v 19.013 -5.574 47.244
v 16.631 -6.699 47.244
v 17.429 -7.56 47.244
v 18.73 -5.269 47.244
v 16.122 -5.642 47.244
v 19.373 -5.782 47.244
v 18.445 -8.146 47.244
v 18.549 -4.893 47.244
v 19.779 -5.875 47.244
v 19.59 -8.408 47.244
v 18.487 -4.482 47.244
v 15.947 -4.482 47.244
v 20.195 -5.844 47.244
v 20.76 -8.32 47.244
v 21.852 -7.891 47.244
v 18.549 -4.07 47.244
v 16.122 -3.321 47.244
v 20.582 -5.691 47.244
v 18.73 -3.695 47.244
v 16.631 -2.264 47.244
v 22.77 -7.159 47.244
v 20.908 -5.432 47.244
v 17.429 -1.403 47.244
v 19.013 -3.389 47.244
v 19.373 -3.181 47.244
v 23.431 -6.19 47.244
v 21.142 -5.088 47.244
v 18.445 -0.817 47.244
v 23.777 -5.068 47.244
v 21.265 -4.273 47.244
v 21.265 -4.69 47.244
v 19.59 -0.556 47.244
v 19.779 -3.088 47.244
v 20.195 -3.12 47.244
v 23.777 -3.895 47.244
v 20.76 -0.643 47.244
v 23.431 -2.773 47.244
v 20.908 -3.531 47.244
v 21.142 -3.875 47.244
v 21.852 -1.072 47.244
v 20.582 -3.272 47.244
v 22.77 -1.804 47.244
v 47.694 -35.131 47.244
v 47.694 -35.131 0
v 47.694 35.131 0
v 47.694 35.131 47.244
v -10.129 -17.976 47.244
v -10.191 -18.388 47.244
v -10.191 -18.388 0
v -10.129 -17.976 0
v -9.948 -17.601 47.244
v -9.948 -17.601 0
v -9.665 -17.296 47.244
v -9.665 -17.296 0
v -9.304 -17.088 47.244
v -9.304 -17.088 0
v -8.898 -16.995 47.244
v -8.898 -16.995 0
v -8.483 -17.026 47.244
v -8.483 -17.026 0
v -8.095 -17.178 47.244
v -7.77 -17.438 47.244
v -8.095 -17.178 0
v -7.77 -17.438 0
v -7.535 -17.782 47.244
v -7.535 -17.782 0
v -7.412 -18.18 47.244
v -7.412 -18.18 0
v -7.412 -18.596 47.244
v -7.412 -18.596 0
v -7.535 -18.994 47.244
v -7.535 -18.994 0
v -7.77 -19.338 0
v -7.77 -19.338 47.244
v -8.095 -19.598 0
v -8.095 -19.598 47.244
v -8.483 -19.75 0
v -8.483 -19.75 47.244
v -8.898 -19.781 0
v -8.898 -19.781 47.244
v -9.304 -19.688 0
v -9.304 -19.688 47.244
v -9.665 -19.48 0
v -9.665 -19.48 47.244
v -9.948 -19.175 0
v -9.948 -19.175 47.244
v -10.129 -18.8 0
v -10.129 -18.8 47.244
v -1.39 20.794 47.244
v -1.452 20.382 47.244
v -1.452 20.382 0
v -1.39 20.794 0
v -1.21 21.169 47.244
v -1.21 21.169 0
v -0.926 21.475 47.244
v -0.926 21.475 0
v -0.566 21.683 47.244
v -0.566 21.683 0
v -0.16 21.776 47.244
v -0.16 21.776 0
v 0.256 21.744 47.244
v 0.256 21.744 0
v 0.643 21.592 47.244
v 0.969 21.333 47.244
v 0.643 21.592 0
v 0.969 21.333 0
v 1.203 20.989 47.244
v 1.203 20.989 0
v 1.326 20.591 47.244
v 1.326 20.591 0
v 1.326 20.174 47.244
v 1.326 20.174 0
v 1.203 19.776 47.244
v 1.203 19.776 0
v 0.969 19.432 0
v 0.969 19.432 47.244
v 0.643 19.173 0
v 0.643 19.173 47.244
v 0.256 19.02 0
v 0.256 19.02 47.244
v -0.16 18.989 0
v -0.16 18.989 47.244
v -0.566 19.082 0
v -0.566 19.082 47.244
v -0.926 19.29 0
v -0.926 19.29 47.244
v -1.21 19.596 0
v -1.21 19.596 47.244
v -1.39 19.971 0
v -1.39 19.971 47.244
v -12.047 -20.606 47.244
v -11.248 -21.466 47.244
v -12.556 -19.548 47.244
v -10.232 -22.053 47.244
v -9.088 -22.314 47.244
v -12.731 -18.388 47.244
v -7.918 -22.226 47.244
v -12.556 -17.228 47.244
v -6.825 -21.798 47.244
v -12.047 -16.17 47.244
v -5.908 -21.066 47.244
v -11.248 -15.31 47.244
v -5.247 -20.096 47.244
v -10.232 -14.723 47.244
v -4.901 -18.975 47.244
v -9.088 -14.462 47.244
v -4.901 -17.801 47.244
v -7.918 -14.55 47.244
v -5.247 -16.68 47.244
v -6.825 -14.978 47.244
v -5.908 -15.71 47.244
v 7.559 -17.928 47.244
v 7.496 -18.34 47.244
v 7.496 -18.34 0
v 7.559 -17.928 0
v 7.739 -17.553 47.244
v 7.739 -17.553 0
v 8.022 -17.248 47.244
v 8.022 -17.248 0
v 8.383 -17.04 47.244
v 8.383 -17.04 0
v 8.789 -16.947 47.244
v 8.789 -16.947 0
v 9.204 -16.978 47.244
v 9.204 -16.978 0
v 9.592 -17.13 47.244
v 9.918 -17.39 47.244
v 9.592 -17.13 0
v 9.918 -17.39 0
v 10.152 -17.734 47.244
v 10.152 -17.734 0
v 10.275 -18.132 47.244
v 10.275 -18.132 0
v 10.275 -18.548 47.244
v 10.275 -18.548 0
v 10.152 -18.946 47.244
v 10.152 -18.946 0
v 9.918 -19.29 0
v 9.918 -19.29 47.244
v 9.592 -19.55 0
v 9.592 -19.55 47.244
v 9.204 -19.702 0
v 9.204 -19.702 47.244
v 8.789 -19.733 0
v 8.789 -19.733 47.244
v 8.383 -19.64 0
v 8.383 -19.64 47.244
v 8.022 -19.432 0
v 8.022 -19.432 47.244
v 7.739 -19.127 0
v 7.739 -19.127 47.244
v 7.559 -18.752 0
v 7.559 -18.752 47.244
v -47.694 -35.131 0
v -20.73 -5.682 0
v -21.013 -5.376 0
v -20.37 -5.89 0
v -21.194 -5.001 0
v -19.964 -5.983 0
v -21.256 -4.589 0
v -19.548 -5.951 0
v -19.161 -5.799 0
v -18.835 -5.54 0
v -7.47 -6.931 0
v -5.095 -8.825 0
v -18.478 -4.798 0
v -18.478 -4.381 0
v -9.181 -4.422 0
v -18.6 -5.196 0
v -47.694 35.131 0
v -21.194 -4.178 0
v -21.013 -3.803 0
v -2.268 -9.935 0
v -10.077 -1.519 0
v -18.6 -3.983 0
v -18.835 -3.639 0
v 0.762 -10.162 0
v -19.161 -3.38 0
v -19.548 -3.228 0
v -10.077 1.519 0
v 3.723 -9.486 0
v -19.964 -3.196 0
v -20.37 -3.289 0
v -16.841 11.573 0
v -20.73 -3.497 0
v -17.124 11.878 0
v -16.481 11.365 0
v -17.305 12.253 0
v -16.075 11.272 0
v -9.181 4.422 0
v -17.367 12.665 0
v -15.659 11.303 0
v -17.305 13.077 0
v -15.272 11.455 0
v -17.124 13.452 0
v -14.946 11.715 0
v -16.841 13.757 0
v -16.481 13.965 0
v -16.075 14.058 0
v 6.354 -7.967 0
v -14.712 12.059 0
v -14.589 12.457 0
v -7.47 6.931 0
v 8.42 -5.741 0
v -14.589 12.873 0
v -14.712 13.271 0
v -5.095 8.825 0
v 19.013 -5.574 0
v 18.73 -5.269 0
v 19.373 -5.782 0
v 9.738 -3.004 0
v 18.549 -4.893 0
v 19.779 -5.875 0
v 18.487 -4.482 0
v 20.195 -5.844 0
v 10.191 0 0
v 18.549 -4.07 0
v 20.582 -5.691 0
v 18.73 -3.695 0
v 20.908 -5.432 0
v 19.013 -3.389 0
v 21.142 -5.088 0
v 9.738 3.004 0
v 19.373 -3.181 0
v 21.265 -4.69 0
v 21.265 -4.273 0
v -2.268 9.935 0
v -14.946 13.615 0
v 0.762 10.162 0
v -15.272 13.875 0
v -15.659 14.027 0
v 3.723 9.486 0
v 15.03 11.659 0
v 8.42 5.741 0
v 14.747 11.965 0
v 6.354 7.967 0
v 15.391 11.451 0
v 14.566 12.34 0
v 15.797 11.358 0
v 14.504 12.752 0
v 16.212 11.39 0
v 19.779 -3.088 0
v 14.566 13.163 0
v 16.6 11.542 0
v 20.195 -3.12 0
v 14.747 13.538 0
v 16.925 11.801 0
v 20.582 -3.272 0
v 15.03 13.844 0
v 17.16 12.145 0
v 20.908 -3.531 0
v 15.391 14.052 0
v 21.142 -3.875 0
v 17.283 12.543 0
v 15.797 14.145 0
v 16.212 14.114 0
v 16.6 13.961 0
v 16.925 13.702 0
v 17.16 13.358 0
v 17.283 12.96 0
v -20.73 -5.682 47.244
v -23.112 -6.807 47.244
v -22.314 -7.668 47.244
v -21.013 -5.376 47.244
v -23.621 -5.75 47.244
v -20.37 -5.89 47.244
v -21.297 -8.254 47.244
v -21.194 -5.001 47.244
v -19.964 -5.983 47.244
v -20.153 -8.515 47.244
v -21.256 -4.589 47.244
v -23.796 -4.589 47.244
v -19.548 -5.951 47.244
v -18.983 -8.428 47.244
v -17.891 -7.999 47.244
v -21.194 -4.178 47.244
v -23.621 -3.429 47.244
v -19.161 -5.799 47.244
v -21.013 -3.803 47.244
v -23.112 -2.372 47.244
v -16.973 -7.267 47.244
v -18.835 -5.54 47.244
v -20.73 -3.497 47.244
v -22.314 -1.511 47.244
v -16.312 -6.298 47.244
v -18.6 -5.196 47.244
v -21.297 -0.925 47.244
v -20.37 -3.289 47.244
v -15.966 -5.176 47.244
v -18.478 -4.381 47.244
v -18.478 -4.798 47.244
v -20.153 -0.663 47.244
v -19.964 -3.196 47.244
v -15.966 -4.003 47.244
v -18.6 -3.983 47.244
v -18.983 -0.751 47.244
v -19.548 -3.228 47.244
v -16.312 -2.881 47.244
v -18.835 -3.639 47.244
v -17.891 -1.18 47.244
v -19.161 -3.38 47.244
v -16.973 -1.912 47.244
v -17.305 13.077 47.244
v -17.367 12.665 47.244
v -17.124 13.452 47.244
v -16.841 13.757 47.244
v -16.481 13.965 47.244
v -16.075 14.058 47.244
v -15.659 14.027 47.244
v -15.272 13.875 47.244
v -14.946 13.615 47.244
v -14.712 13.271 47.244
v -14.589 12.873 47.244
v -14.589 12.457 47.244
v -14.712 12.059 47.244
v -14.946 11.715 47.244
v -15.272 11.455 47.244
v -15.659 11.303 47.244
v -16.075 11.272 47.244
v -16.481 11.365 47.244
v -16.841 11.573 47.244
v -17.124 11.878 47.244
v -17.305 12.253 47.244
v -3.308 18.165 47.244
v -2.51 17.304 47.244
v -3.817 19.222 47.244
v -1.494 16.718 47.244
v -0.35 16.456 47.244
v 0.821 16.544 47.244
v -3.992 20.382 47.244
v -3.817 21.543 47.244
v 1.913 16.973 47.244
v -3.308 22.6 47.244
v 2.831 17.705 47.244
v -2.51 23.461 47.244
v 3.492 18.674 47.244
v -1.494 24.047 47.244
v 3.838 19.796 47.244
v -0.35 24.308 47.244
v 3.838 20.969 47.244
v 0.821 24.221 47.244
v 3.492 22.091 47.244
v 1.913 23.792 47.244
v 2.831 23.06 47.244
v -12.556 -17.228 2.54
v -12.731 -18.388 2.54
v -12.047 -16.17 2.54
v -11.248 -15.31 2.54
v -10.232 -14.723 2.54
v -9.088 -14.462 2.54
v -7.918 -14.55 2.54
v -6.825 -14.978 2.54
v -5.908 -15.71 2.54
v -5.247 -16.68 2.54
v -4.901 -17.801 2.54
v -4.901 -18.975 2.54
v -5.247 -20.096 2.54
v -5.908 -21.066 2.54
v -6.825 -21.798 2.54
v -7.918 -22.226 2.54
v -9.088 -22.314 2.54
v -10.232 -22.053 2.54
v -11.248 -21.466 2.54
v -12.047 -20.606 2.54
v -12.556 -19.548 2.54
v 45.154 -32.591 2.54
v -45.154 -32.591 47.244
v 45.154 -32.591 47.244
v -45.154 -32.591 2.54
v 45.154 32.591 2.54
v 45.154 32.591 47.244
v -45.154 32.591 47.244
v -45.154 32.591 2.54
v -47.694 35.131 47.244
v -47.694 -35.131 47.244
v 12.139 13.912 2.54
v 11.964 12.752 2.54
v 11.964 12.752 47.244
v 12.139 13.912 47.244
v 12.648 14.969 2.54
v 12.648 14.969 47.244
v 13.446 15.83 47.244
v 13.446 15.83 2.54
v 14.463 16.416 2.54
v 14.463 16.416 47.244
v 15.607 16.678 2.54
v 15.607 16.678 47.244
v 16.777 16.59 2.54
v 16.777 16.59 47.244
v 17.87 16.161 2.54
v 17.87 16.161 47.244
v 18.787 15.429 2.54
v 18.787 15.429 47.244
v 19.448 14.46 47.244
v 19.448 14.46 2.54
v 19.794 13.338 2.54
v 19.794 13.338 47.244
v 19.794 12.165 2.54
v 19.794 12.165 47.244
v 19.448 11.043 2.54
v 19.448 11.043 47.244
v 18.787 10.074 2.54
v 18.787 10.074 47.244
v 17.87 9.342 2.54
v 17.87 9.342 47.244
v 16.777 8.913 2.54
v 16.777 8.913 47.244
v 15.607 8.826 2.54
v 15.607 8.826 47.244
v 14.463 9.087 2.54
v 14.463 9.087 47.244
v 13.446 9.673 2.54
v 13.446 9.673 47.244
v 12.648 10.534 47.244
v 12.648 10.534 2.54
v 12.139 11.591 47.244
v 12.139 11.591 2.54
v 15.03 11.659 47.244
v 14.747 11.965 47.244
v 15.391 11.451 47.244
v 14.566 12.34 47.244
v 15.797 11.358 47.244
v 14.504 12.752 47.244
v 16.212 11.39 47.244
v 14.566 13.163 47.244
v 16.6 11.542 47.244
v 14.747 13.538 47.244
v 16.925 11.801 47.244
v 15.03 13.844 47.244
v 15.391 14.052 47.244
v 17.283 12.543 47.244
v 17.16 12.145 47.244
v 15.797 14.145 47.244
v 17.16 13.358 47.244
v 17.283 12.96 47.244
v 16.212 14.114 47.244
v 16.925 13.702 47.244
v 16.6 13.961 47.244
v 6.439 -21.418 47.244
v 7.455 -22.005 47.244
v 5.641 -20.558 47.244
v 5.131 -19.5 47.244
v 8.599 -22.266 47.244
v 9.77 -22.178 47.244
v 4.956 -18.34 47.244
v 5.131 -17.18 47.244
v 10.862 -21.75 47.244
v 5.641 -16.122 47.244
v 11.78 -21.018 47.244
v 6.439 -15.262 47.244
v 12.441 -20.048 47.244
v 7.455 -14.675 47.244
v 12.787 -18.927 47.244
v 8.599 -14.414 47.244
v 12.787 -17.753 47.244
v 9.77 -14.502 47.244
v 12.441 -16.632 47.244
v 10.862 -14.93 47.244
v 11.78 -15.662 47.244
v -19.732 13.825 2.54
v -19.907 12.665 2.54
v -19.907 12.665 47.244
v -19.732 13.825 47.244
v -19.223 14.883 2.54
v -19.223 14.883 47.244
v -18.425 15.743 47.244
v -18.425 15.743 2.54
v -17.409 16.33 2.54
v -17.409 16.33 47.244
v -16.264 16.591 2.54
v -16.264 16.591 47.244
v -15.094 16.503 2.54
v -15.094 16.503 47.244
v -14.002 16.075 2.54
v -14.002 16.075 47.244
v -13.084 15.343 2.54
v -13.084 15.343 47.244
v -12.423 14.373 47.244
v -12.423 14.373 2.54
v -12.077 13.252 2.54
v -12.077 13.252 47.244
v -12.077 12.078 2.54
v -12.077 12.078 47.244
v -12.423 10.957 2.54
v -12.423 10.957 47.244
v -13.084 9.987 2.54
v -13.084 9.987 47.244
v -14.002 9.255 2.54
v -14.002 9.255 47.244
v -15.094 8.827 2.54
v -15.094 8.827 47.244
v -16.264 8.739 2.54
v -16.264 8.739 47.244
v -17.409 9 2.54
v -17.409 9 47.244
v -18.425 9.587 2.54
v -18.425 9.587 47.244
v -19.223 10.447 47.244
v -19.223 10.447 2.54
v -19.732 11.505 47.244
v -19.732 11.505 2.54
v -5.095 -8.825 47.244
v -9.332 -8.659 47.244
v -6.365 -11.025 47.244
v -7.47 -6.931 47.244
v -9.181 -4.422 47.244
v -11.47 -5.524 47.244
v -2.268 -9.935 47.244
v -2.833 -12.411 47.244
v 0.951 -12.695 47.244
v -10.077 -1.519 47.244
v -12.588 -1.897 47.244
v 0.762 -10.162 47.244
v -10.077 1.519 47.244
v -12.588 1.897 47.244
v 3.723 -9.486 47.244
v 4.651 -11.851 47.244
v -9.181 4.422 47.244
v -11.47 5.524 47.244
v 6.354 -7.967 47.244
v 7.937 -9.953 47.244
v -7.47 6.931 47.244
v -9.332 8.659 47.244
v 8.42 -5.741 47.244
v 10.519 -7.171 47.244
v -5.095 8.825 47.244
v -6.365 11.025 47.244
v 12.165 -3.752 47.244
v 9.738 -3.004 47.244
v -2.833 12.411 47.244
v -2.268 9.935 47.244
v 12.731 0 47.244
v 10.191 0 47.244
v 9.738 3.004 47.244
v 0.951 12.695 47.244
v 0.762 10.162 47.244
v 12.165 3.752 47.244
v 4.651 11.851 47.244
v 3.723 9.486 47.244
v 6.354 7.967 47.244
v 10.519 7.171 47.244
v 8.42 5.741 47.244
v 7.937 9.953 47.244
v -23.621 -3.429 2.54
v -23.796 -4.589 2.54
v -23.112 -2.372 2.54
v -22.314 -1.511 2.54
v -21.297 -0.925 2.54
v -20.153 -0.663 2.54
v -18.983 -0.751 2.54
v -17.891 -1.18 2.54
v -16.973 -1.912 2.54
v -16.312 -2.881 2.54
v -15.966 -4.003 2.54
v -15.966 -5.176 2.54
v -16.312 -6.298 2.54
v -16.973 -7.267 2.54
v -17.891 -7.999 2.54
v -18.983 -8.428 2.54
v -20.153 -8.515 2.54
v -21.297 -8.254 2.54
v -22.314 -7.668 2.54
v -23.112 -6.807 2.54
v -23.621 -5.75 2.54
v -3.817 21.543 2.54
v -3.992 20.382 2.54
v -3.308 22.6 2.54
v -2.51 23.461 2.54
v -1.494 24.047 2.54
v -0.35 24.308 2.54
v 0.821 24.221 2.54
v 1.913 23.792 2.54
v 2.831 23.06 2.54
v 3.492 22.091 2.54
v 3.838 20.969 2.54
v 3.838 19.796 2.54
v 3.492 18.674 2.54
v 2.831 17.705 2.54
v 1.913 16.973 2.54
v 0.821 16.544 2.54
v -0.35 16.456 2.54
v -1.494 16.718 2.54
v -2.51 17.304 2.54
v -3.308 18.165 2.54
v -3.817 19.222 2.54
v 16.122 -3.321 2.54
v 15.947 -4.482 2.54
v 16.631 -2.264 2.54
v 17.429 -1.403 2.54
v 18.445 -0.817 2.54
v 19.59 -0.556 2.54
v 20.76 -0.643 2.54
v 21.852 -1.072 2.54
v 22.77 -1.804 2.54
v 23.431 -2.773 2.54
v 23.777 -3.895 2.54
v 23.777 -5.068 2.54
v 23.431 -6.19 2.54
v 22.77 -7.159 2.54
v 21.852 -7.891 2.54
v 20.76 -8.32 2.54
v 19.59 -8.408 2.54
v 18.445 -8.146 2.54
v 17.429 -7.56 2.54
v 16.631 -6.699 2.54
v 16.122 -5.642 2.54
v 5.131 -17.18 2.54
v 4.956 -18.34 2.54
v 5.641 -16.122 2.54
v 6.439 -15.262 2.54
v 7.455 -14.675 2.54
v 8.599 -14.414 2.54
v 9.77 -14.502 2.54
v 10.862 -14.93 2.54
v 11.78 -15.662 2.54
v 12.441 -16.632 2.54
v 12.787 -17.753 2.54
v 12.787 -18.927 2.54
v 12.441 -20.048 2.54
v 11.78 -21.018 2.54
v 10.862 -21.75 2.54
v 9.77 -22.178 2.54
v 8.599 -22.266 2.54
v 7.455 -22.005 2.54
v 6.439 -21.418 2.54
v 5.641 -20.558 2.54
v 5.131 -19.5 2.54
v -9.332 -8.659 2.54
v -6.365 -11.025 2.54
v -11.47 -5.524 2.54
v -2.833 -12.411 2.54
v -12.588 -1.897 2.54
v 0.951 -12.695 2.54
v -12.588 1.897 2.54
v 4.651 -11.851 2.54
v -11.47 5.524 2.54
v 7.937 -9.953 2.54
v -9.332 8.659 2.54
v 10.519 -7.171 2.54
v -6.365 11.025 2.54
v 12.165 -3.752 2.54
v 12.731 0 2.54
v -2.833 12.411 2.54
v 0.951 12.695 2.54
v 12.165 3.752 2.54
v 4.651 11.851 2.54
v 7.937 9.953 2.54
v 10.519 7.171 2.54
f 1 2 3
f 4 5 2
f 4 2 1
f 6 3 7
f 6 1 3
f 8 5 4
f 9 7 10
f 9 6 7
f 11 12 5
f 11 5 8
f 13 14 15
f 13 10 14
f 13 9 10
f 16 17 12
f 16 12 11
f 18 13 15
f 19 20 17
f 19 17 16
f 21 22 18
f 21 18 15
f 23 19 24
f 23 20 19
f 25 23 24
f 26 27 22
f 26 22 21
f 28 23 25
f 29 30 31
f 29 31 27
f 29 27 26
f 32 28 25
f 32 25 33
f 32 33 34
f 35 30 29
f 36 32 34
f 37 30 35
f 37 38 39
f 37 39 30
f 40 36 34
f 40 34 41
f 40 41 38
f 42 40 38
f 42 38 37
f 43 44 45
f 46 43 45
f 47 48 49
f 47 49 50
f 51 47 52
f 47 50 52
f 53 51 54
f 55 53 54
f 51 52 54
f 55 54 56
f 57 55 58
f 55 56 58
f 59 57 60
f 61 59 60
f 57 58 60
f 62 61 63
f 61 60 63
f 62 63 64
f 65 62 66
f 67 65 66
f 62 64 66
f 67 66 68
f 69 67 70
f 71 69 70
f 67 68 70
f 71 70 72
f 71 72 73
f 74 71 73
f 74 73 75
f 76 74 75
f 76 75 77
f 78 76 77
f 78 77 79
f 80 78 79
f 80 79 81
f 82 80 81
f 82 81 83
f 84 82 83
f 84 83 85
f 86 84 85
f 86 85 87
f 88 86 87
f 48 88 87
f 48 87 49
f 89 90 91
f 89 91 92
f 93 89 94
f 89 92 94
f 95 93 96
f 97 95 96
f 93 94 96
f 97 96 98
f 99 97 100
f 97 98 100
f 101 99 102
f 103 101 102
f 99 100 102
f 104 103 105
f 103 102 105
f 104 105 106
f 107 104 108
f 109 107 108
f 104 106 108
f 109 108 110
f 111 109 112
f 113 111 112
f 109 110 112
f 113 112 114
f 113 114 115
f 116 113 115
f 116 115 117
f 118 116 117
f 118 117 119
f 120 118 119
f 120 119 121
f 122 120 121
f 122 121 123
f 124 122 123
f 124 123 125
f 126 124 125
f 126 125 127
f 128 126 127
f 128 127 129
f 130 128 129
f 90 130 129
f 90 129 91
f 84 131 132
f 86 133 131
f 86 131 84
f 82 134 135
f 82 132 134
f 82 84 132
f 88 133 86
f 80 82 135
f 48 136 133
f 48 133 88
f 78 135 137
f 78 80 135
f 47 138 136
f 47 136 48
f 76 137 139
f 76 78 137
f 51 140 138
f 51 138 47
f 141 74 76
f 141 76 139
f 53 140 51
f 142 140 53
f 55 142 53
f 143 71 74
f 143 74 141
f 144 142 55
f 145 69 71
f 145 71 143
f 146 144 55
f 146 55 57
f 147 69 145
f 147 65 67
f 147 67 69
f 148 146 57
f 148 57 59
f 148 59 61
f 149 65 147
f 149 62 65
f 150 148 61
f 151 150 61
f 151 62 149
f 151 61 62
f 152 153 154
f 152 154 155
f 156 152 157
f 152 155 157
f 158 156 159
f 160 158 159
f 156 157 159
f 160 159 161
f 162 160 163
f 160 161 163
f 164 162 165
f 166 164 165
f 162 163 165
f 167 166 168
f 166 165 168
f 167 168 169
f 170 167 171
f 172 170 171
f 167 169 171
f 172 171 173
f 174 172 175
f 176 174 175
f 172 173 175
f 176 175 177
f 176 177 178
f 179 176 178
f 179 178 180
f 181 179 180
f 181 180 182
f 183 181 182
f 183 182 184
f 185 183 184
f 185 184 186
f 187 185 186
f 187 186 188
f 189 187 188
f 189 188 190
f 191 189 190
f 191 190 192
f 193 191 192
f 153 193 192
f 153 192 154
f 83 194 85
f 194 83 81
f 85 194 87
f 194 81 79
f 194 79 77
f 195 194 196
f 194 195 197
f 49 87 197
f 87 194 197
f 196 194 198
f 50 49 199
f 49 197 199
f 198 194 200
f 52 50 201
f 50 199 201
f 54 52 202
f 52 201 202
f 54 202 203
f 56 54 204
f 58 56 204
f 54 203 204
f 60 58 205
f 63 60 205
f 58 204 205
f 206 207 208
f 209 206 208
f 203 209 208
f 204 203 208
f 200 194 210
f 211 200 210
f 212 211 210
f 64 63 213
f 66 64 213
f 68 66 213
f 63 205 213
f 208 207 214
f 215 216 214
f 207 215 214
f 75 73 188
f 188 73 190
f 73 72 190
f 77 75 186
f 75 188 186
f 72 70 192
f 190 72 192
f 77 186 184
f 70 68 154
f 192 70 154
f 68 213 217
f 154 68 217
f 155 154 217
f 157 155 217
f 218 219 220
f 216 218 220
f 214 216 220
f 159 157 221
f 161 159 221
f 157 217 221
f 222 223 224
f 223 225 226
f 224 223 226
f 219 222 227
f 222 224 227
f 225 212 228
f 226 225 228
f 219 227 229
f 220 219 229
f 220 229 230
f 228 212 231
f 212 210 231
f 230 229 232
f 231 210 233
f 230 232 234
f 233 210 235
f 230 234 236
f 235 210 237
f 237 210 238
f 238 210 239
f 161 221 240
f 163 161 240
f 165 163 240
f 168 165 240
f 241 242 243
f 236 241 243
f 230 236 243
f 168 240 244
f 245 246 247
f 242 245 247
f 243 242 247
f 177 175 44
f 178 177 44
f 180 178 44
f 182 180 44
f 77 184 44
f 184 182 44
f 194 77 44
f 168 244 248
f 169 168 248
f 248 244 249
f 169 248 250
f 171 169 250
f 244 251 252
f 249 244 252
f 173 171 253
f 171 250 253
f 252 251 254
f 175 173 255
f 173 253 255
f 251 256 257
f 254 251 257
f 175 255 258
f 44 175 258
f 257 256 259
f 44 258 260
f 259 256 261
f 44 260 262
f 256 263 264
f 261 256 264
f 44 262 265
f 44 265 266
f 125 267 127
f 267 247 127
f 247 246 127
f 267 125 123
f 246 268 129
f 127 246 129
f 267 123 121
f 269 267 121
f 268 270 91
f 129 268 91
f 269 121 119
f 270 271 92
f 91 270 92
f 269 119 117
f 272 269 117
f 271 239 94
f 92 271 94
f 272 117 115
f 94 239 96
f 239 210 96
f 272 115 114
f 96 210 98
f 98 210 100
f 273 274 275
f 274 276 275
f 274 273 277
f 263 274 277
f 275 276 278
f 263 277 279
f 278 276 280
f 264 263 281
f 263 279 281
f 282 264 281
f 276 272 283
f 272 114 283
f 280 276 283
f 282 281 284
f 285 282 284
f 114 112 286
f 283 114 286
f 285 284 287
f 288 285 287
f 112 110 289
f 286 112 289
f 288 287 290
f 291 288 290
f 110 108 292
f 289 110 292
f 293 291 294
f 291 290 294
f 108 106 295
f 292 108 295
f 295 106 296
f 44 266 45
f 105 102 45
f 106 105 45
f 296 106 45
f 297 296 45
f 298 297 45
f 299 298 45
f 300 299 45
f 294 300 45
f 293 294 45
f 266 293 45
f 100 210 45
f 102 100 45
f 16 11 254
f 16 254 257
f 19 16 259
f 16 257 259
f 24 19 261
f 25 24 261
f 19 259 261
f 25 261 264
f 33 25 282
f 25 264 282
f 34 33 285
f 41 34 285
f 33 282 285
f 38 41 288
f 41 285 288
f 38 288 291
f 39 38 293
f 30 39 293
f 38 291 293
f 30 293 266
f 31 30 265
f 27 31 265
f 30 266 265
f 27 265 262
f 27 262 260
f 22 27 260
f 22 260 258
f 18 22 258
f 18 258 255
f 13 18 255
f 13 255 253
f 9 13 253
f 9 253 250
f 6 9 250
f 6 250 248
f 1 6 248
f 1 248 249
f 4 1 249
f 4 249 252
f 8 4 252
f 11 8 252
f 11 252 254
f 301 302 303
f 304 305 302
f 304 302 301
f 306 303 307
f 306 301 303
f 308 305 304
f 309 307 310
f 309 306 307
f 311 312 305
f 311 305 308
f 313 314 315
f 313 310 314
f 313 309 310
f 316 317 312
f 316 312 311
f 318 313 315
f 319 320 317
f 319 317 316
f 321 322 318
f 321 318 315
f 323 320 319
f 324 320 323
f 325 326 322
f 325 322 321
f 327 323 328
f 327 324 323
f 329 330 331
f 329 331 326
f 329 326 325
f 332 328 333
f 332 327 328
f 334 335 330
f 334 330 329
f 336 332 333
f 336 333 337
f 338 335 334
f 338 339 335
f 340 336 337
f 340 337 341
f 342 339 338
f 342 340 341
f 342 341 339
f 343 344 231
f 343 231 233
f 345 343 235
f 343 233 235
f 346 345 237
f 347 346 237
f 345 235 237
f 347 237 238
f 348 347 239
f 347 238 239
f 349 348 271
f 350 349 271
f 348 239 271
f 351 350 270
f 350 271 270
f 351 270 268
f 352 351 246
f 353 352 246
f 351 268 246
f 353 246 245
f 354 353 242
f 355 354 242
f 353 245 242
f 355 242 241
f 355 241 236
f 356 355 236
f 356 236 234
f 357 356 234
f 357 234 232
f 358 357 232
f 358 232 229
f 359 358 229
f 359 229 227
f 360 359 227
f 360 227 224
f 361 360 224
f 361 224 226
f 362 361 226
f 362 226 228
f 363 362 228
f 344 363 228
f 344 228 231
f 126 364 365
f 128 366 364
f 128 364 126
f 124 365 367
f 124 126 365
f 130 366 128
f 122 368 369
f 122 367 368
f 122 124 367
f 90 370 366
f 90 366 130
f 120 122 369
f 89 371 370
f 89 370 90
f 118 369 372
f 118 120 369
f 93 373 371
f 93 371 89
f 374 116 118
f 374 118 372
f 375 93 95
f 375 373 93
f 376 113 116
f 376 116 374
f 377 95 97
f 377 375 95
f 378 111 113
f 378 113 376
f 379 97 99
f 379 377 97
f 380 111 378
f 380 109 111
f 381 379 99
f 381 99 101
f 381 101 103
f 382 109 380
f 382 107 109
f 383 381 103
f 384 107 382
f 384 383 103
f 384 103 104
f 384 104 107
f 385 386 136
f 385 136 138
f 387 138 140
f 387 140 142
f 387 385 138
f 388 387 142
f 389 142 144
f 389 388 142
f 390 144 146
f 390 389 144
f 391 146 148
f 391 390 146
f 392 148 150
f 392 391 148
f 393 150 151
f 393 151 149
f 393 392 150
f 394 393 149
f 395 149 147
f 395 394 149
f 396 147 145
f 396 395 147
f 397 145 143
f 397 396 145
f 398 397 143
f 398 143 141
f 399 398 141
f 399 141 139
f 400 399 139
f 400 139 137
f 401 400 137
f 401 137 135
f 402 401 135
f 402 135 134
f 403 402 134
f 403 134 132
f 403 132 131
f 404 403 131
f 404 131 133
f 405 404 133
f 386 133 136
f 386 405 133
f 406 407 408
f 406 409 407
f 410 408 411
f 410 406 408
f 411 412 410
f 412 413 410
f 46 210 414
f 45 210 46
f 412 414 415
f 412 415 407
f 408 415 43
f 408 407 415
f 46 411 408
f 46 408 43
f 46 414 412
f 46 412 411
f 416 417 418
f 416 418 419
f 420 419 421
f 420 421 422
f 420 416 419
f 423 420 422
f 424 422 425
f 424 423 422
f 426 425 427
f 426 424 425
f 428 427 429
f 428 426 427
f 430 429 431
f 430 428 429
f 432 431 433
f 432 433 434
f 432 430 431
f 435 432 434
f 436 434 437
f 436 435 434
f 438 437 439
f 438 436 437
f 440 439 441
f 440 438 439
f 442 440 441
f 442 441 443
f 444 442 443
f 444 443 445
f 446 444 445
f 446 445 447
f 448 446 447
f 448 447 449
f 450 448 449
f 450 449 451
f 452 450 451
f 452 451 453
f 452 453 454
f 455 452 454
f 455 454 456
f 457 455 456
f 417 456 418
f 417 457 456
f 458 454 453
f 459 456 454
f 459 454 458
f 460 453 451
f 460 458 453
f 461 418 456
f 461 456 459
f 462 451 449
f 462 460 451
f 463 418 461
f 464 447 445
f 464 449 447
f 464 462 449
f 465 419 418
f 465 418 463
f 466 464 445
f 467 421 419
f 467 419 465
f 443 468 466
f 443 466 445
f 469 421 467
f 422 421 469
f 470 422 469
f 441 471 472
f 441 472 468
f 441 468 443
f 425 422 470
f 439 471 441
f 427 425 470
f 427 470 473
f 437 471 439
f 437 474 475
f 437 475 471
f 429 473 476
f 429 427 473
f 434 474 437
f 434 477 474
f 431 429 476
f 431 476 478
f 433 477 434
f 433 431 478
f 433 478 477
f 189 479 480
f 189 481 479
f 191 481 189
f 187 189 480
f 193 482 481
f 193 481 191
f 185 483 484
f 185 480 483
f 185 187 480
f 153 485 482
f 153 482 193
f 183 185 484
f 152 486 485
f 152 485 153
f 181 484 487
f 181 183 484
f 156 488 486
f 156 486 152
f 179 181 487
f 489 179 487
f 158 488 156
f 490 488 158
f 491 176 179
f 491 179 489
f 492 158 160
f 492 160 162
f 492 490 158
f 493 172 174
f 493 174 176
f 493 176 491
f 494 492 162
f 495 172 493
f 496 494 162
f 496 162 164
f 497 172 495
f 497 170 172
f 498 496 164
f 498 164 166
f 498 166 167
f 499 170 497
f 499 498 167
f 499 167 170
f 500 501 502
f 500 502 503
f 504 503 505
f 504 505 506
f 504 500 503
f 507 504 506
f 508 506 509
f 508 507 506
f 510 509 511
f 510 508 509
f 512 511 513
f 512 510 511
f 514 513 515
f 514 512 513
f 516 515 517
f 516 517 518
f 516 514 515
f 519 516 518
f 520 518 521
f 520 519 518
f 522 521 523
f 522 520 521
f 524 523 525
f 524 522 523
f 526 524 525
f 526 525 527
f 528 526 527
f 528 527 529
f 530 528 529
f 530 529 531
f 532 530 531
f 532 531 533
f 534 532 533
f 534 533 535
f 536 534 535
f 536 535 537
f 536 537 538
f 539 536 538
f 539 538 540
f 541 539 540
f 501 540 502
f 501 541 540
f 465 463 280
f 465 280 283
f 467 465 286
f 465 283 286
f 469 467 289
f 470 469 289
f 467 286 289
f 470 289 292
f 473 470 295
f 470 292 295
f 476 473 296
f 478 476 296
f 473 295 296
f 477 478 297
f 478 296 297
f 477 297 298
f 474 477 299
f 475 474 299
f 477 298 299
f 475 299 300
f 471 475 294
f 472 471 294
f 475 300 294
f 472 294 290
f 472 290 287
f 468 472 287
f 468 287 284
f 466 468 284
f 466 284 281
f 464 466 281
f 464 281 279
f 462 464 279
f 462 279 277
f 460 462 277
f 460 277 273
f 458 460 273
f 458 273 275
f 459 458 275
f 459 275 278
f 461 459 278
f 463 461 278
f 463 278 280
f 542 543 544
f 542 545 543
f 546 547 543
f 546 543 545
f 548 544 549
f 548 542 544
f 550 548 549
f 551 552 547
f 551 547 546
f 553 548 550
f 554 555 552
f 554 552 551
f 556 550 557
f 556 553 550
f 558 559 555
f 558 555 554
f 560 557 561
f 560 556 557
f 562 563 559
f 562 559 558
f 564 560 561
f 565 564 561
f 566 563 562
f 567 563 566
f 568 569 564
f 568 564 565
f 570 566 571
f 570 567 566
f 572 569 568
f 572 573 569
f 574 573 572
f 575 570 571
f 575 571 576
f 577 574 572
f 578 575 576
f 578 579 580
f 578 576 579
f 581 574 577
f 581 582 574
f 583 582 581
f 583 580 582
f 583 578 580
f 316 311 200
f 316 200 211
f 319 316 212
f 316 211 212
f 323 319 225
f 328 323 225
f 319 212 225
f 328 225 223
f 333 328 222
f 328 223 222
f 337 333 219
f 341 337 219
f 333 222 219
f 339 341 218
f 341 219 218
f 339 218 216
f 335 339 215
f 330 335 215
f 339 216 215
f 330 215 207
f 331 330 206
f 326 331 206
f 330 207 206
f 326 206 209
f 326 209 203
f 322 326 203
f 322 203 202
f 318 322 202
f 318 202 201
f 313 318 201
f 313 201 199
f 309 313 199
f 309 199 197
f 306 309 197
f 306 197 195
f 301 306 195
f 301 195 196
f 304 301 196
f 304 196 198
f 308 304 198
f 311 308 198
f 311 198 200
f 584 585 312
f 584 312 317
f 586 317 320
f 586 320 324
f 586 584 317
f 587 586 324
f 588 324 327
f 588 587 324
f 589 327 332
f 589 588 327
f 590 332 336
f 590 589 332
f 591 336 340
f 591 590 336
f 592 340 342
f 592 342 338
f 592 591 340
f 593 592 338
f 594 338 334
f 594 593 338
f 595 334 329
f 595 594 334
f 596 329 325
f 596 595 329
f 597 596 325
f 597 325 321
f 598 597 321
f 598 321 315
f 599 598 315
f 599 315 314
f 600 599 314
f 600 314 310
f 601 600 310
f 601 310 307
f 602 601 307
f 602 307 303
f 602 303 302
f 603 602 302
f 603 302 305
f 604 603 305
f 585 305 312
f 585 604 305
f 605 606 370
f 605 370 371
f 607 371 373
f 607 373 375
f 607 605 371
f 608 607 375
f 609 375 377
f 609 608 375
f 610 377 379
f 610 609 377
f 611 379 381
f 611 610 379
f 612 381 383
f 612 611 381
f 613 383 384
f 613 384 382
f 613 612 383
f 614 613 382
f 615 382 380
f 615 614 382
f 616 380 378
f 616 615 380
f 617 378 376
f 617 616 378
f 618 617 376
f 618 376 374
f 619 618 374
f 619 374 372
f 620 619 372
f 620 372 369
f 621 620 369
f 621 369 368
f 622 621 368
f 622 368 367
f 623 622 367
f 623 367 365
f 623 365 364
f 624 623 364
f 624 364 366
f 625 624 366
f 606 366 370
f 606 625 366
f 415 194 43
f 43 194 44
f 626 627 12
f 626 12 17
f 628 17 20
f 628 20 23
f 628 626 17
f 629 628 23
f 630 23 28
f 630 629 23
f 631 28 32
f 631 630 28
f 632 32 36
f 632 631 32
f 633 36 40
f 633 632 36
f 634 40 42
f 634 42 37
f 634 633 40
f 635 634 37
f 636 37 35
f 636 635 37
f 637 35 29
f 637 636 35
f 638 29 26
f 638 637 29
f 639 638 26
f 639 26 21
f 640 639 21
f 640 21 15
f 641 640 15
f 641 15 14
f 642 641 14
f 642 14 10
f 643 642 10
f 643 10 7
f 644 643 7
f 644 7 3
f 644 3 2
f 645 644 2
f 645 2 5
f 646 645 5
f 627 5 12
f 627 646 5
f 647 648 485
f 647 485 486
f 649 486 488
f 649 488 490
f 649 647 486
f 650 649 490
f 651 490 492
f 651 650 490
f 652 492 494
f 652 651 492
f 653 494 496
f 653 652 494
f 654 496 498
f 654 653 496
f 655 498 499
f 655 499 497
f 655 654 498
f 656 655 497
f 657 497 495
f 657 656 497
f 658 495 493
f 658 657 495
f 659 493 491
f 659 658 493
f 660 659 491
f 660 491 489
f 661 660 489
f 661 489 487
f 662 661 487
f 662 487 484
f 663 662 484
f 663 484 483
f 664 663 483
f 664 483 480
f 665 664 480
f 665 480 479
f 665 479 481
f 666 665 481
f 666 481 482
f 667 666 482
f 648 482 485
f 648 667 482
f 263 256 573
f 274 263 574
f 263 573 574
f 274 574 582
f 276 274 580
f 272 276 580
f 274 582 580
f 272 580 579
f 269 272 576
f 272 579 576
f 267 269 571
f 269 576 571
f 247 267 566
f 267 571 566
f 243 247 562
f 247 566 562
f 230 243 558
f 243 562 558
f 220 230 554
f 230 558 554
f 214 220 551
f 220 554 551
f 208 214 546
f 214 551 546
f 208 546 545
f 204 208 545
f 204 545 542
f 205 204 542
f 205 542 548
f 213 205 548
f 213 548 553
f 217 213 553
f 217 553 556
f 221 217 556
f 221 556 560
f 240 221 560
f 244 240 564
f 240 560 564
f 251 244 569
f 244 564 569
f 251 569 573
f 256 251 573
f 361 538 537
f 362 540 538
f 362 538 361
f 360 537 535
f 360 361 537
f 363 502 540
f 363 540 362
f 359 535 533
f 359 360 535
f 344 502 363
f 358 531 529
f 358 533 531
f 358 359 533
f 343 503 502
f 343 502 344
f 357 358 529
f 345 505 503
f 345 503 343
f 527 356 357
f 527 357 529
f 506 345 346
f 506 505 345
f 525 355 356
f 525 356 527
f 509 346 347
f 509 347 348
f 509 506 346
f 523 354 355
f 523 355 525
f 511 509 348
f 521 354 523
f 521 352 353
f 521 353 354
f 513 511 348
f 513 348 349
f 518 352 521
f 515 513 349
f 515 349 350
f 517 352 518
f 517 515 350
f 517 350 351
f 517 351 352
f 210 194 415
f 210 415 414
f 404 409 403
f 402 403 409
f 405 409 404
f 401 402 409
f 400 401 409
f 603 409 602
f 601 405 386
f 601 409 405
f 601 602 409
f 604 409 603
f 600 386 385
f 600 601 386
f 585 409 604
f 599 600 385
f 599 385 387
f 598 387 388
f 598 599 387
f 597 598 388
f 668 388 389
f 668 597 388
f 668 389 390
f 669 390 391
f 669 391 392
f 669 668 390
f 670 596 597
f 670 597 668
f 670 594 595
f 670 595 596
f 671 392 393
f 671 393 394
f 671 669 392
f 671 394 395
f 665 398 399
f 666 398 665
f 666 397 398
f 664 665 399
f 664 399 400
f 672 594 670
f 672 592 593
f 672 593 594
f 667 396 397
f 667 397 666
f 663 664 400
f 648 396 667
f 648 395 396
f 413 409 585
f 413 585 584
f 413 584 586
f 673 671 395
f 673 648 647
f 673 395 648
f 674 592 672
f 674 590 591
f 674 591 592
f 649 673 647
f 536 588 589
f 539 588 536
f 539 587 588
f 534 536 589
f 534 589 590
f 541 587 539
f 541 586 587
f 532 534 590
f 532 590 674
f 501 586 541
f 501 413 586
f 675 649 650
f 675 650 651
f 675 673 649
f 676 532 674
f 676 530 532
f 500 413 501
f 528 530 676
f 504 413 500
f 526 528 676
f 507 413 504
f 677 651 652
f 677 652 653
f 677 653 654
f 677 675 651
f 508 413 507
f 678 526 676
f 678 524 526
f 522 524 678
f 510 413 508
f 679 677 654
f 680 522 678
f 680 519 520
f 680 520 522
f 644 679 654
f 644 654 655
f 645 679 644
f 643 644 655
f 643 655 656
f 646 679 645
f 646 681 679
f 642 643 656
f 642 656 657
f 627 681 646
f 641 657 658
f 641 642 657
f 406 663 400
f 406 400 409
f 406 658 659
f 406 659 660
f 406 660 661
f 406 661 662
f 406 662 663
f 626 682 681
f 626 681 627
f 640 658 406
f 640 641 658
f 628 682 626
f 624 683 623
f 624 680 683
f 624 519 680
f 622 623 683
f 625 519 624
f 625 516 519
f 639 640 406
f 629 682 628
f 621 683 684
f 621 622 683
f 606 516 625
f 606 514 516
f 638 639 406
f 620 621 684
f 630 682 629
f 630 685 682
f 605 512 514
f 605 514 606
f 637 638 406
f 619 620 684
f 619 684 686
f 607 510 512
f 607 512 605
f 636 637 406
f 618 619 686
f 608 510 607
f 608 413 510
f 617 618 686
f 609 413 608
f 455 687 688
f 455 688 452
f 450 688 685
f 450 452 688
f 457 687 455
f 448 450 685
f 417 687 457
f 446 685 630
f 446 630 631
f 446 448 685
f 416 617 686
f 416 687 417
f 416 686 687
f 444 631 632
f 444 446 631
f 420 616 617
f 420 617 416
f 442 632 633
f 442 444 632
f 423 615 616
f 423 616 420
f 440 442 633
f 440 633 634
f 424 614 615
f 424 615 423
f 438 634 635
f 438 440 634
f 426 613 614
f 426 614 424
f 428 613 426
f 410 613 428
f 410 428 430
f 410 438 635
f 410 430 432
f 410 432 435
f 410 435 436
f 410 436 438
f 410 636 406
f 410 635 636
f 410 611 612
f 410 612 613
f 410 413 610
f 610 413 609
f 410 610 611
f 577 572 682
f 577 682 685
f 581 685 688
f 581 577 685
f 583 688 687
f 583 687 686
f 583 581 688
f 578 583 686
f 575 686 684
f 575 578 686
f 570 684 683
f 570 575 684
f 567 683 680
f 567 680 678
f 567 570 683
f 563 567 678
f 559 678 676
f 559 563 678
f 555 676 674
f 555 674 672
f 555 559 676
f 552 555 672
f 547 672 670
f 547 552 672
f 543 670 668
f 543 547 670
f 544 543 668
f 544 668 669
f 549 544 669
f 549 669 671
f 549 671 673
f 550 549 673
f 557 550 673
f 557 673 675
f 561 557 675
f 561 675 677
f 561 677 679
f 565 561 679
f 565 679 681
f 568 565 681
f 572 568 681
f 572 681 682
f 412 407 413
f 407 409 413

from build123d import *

# Parameters (mm, degrees)
F0_W     = 95.3876376152
F0_H     = 70.2621340752
F1_DEPTH = 47.244
F3_D     = 2.794
F4_R     = 10.1906585652
F5_DEPTH = 47.244
F6_T     = -2.54


with BuildPart() as f1:
    # F0 (on Top) → F1 (new body)
    with BuildSketch(Plane.XY):
        Rectangle(F0_W, F0_H)
    extrude(amount=F1_DEPTH)

    # F3 (through all)
    with Locations(Plane.XY.offset(47.244)):
        with Locations((-0.0553504175, 20.3824730712), (-15.9701695585, 12.6649893976), (-19.8591252898, -4.5894896111), (-8.7937546256, -18.3879893341), (8.8934926316, -18.3399580419), (19.883758543, -4.4815642772), (15.9011487168, 12.7515387955)):
            Hole(F3_D / 2)

    # F4 (on face) → F5 (cut, through all)
    with BuildSketch(Plane.XY.offset(47.244)):
        Circle(F4_R)
    extrude(amount=-F5_DEPTH, mode=Mode.SUBTRACT)

    # F6
    f6_openings = [f1.faces().sort_by_distance(p)[0] for p in [
        (-46.509101, 0, 47.244),
    ]]
    offset(amount=F6_T, openings=f6_openings)


solid = f1.part
